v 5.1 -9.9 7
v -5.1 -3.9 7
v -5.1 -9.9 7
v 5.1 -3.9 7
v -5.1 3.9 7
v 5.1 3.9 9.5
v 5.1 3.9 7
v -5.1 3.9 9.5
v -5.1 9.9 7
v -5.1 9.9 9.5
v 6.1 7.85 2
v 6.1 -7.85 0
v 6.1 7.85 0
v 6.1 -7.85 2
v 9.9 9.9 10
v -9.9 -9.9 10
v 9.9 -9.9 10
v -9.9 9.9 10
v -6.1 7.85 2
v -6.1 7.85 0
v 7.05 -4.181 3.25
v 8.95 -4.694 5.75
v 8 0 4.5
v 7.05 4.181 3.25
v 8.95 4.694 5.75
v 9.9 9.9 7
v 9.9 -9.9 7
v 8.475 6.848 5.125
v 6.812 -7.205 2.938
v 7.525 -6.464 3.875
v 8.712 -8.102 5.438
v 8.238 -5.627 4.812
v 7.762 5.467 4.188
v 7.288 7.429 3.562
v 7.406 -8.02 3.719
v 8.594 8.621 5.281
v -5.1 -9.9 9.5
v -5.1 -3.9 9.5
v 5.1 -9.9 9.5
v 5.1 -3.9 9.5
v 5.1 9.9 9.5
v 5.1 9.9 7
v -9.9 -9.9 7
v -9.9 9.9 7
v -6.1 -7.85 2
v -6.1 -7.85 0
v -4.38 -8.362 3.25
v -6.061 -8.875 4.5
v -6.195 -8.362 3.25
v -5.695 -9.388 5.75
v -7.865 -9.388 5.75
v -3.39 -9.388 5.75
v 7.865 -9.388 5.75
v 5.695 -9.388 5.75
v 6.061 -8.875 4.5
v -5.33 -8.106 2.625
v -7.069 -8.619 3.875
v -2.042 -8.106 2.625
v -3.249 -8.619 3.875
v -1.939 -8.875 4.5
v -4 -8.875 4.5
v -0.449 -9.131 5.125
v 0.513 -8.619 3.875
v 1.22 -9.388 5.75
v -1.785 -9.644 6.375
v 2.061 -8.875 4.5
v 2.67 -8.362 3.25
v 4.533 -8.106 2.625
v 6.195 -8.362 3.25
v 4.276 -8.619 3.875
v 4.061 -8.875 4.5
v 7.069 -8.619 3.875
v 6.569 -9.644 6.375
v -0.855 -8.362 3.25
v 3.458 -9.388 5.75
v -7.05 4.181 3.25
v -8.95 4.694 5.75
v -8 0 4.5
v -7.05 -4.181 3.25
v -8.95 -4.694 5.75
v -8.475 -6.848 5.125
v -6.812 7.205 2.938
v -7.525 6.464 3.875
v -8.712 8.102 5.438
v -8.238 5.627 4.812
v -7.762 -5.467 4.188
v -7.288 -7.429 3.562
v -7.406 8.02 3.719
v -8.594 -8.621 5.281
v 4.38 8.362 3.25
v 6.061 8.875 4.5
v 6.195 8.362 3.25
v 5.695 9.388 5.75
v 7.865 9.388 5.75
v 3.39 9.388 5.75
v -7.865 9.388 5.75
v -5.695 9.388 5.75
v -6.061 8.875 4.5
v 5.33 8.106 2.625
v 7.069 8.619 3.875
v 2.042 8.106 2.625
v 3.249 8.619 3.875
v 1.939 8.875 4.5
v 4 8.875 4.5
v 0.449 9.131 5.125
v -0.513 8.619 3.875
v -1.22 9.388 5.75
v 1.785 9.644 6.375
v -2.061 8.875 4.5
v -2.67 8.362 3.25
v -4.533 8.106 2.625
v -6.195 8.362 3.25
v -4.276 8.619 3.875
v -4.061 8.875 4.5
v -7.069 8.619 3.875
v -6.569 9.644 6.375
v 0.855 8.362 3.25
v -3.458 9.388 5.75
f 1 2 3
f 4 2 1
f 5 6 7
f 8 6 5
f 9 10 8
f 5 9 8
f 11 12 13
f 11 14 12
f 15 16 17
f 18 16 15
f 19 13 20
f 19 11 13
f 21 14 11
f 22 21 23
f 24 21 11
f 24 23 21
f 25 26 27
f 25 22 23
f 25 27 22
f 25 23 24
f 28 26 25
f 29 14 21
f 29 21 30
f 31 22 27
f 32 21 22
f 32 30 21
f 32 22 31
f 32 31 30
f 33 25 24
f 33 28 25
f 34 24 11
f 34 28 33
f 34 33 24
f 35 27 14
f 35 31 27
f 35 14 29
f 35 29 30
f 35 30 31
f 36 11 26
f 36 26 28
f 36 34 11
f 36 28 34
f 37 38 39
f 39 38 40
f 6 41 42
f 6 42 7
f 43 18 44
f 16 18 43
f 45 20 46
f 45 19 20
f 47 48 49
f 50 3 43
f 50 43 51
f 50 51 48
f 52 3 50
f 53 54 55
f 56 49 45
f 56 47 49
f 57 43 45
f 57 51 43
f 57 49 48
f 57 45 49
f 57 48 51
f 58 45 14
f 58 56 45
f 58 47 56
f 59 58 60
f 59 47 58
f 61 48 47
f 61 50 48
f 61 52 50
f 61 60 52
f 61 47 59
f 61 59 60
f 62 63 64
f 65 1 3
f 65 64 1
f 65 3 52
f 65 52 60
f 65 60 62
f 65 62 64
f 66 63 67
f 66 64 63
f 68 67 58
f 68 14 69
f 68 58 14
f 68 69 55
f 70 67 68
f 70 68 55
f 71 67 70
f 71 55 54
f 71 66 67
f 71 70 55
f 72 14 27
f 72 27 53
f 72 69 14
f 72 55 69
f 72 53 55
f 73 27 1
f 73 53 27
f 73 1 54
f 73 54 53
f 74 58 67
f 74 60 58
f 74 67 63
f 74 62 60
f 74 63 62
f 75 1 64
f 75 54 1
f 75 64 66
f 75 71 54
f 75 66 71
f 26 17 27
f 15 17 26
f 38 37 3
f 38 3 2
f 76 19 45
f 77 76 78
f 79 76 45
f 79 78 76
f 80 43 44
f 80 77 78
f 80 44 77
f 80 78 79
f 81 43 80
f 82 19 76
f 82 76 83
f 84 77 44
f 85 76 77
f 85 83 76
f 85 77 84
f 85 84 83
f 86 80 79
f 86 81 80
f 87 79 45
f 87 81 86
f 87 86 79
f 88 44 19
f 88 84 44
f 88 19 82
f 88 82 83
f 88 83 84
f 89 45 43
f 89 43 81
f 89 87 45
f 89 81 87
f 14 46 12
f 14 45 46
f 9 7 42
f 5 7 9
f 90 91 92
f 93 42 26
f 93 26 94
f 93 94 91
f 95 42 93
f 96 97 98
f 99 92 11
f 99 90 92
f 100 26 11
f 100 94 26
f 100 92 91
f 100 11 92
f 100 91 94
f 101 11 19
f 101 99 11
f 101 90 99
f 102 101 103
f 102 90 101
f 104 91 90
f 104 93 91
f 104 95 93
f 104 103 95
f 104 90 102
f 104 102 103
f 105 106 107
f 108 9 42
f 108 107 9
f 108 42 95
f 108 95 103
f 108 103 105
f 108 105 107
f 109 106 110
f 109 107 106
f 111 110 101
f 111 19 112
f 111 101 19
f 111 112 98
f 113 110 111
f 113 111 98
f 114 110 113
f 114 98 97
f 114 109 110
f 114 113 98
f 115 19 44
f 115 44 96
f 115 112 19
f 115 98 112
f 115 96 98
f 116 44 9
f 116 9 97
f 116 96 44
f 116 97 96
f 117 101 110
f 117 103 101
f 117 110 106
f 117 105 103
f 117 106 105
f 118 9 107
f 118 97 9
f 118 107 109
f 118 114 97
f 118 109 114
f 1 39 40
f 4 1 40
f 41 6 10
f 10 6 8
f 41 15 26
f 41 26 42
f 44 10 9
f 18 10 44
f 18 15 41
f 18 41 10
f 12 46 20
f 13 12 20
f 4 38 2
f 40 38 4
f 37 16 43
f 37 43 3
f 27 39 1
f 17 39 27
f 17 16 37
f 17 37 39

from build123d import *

# Parameters (mm, degrees)
SKETCH030_W           = 12.2
SKETCH030_H           = 15.7
SKETCH031_W           = 12.2
SKETCH031_H           = 15.7
SKETCH032_W           = 19.8
SKETCH032_H           = 19.8
SKETCH033_W           = 19.8
SKETCH033_H           = 19.8
SKETCH034_W           = 10.2
SKETCH034_H           = 15.2
POCKET018_DEPTH       = 2.5
POLARPATTERN003_COUNT = 2


with BuildPart() as part:
    # Sketch030 → AdditiveLoft section 0
    with BuildSketch(Plane.XY):
        Rectangle(SKETCH030_W, SKETCH030_H)
    # Sketch031 → AdditiveLoft section 1
    with BuildSketch(Plane.XY.offset(2)):
        Rectangle(SKETCH031_W, SKETCH031_H)
    # Sketch032 → AdditiveLoft section 2
    with BuildSketch(Plane.XY.offset(7)):
        Rectangle(SKETCH032_W, SKETCH032_H)
    # Sketch033 → AdditiveLoft section 3
    with BuildSketch(Plane.XY.offset(10)):
        Rectangle(SKETCH033_W, SKETCH033_H)
    loft(ruled=True)

    # Sketch034 → Pocket018 (cut)
    with BuildSketch(Plane.XY.offset(9.5)):
        with Locations((0, -11.5)):
            Rectangle(SKETCH034_W, SKETCH034_H)
    pocket018 = extrude(amount=-POCKET018_DEPTH, mode=Mode.SUBTRACT)

    # PolarPattern003: Pocket018 ×2 about axis
    polarpattern003_axis = Axis((0, 0, 9.5), (0, 0, 1))
    for i in range(1, POLARPATTERN003_COUNT):
        add(pocket018.rotate(polarpattern003_axis, i * 360 / POLARPATTERN003_COUNT), mode=Mode.SUBTRACT)


solid = part.part
